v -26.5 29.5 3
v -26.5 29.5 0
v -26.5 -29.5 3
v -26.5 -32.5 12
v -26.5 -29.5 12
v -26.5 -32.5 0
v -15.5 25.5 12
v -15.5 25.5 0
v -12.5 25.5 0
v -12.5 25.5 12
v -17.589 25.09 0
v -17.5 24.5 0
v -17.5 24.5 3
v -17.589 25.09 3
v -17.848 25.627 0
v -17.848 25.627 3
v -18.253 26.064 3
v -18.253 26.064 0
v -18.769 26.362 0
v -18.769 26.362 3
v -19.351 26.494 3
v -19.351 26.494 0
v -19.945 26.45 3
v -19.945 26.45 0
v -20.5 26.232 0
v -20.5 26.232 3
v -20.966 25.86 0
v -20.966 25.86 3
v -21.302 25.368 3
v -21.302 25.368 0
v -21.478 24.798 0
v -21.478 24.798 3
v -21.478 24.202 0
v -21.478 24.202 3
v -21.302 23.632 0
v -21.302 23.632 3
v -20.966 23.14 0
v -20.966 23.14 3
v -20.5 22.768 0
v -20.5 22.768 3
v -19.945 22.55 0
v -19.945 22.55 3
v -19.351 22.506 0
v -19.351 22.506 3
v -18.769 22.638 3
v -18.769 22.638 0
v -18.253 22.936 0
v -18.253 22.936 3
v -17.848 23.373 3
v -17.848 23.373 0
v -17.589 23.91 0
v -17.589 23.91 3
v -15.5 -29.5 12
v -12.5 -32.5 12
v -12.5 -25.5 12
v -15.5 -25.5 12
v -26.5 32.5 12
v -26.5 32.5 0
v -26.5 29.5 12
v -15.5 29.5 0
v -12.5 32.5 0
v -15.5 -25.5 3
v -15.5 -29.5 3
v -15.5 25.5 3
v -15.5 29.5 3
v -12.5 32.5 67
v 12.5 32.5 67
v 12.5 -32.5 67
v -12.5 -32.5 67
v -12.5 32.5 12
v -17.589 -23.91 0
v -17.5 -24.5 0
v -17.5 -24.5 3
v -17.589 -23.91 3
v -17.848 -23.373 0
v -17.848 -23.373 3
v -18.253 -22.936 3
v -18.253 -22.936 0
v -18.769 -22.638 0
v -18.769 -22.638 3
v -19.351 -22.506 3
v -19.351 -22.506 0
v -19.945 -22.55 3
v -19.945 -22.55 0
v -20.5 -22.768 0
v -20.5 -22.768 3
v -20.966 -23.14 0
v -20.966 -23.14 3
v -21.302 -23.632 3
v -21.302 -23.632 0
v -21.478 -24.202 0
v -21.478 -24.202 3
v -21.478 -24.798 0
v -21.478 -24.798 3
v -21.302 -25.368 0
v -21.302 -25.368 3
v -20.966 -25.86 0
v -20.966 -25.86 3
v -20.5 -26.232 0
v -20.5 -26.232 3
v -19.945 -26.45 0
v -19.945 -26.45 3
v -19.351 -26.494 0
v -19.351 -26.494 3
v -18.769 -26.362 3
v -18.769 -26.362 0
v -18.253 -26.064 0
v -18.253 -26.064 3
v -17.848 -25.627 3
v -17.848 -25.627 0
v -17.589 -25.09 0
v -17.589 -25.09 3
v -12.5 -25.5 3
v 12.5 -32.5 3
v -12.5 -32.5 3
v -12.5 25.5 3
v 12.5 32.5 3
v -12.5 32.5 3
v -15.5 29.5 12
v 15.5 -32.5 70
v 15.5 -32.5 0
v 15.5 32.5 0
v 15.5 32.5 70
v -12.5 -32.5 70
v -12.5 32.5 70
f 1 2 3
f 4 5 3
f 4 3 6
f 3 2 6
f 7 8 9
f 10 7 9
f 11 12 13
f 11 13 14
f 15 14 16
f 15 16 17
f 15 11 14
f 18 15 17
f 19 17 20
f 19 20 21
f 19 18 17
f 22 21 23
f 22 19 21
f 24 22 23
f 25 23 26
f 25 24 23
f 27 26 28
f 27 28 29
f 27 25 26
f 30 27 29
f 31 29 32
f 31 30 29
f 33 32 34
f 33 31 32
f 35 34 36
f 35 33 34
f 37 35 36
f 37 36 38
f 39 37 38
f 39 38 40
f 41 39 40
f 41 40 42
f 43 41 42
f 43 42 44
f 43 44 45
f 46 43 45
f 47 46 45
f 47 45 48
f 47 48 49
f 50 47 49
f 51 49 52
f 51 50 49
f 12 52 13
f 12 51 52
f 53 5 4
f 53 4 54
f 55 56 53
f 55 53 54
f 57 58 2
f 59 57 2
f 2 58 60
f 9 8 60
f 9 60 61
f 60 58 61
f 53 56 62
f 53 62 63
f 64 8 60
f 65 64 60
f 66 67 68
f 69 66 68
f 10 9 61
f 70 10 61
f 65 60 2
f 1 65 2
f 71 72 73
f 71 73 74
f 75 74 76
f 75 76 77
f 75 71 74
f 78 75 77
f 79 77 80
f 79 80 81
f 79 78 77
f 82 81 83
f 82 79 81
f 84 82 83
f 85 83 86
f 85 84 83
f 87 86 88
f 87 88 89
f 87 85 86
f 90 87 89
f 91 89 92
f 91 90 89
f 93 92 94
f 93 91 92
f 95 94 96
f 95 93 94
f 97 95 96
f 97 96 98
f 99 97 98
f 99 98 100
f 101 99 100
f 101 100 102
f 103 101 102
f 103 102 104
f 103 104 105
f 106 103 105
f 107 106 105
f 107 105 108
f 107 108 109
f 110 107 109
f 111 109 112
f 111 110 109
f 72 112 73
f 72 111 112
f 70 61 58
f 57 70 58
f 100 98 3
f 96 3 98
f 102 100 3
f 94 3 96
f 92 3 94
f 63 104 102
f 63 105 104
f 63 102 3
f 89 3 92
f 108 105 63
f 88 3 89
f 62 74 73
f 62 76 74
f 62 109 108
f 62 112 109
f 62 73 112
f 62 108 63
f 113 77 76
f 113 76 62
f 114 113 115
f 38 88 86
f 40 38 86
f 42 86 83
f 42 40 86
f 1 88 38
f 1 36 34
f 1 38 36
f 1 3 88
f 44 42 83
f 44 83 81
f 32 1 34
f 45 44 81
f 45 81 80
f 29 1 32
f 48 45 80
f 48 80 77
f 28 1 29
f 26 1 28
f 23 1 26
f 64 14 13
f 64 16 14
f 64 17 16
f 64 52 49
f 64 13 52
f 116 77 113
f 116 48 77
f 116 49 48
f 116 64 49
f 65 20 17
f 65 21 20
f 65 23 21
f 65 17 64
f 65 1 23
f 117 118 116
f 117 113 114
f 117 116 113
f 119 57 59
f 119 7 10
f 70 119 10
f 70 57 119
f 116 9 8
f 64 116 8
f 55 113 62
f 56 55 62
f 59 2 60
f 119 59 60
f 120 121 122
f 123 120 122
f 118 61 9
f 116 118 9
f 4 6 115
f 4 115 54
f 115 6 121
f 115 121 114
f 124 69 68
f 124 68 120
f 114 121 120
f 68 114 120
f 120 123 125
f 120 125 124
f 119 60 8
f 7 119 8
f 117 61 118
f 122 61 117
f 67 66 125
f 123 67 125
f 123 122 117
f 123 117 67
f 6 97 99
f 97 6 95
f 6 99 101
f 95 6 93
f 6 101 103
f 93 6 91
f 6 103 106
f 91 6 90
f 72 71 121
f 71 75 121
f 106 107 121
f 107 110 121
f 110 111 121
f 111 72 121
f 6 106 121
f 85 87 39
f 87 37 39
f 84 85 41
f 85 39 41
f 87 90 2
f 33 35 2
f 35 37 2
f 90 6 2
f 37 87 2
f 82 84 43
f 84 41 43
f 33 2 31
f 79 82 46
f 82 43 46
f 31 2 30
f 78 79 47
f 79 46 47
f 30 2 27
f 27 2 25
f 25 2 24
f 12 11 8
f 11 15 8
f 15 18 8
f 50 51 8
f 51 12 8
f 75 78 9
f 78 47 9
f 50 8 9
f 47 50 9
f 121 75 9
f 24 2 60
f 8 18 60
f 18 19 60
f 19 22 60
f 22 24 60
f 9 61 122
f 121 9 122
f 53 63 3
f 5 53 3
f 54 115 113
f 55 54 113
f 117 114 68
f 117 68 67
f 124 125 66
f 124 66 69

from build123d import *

# Parameters (mm, degrees)
F1_DEPTH = 12
F0_R     = 2
F2_DEPTH = 3
F3_DEPTH = 3
F0_W     = 3
F0_H     = 65
F4_DEPTH = 70
F5_W     = 65
F5_H     = 3
F6_DEPTH = 25


with BuildPart() as f1:
    # F0 (on Top) → F1 (new body)
    with BuildSketch(Plane.XY):
        Polygon((-12.5, 25.5), (-12.5, 32.5), (-26.5, 32.5), (-26.5, 29.5), (-15.5, 29.5), (-15.5, 25.5), align=None)
    extrude(amount=F1_DEPTH)


with BuildPart() as f1b:
    # F0 (on Top) → F1, piece 2 (new body)
    with BuildSketch(Plane.XY):
        Polygon((-12.5, -32.5), (-12.5, -25.5), (-15.5, -25.5), (-15.5, -29.5), (-26.5, -29.5), (-26.5, -32.5), align=None)
    extrude(amount=F1_DEPTH)

    # F0 (on Top) → F2 (join)
    with BuildSketch(Plane.XY):
        Polygon((-12.5, -25.5), (-12.5, 25.5), (-15.5, 25.5), (-15.5, 29.5), (-26.5, 29.5), (-26.5, -29.5), (-15.5, -29.5), (-15.5, -25.5), align=None)
        with Locations((-19.5, -24.5)):
            Circle(F0_R, mode=Mode.SUBTRACT)
        with Locations((-19.5, 24.5)):
            Circle(F0_R, mode=Mode.SUBTRACT)
    extrude(amount=F2_DEPTH)

    # F0 (on Top) → F3 (join)
    with BuildSketch(Plane.XY):
        Polygon((12.5, 32.5), (-12.5, 32.5), (-12.5, 25.5), (-12.5, -25.5), (-12.5, -32.5), (12.5, -32.5), align=None)
    extrude(amount=F3_DEPTH)

    # F0 (on Top) → F4 (join)
    with BuildSketch(Plane.XY):
        with Locations((14, 0)):
            Rectangle(F0_W, F0_H)
    extrude(amount=F4_DEPTH)

    # F5 (on face) → F6 (join)
    with BuildSketch(Plane(origin=(12.5, 0, 0), x_dir=(0, -1, 0), z_dir=(-1, 0, 0))):
        with Locations((0, 68.5)):
            Rectangle(F5_W, F5_H)
    extrude(amount=F6_DEPTH)


solid = Compound([f1.part, f1b.part])
